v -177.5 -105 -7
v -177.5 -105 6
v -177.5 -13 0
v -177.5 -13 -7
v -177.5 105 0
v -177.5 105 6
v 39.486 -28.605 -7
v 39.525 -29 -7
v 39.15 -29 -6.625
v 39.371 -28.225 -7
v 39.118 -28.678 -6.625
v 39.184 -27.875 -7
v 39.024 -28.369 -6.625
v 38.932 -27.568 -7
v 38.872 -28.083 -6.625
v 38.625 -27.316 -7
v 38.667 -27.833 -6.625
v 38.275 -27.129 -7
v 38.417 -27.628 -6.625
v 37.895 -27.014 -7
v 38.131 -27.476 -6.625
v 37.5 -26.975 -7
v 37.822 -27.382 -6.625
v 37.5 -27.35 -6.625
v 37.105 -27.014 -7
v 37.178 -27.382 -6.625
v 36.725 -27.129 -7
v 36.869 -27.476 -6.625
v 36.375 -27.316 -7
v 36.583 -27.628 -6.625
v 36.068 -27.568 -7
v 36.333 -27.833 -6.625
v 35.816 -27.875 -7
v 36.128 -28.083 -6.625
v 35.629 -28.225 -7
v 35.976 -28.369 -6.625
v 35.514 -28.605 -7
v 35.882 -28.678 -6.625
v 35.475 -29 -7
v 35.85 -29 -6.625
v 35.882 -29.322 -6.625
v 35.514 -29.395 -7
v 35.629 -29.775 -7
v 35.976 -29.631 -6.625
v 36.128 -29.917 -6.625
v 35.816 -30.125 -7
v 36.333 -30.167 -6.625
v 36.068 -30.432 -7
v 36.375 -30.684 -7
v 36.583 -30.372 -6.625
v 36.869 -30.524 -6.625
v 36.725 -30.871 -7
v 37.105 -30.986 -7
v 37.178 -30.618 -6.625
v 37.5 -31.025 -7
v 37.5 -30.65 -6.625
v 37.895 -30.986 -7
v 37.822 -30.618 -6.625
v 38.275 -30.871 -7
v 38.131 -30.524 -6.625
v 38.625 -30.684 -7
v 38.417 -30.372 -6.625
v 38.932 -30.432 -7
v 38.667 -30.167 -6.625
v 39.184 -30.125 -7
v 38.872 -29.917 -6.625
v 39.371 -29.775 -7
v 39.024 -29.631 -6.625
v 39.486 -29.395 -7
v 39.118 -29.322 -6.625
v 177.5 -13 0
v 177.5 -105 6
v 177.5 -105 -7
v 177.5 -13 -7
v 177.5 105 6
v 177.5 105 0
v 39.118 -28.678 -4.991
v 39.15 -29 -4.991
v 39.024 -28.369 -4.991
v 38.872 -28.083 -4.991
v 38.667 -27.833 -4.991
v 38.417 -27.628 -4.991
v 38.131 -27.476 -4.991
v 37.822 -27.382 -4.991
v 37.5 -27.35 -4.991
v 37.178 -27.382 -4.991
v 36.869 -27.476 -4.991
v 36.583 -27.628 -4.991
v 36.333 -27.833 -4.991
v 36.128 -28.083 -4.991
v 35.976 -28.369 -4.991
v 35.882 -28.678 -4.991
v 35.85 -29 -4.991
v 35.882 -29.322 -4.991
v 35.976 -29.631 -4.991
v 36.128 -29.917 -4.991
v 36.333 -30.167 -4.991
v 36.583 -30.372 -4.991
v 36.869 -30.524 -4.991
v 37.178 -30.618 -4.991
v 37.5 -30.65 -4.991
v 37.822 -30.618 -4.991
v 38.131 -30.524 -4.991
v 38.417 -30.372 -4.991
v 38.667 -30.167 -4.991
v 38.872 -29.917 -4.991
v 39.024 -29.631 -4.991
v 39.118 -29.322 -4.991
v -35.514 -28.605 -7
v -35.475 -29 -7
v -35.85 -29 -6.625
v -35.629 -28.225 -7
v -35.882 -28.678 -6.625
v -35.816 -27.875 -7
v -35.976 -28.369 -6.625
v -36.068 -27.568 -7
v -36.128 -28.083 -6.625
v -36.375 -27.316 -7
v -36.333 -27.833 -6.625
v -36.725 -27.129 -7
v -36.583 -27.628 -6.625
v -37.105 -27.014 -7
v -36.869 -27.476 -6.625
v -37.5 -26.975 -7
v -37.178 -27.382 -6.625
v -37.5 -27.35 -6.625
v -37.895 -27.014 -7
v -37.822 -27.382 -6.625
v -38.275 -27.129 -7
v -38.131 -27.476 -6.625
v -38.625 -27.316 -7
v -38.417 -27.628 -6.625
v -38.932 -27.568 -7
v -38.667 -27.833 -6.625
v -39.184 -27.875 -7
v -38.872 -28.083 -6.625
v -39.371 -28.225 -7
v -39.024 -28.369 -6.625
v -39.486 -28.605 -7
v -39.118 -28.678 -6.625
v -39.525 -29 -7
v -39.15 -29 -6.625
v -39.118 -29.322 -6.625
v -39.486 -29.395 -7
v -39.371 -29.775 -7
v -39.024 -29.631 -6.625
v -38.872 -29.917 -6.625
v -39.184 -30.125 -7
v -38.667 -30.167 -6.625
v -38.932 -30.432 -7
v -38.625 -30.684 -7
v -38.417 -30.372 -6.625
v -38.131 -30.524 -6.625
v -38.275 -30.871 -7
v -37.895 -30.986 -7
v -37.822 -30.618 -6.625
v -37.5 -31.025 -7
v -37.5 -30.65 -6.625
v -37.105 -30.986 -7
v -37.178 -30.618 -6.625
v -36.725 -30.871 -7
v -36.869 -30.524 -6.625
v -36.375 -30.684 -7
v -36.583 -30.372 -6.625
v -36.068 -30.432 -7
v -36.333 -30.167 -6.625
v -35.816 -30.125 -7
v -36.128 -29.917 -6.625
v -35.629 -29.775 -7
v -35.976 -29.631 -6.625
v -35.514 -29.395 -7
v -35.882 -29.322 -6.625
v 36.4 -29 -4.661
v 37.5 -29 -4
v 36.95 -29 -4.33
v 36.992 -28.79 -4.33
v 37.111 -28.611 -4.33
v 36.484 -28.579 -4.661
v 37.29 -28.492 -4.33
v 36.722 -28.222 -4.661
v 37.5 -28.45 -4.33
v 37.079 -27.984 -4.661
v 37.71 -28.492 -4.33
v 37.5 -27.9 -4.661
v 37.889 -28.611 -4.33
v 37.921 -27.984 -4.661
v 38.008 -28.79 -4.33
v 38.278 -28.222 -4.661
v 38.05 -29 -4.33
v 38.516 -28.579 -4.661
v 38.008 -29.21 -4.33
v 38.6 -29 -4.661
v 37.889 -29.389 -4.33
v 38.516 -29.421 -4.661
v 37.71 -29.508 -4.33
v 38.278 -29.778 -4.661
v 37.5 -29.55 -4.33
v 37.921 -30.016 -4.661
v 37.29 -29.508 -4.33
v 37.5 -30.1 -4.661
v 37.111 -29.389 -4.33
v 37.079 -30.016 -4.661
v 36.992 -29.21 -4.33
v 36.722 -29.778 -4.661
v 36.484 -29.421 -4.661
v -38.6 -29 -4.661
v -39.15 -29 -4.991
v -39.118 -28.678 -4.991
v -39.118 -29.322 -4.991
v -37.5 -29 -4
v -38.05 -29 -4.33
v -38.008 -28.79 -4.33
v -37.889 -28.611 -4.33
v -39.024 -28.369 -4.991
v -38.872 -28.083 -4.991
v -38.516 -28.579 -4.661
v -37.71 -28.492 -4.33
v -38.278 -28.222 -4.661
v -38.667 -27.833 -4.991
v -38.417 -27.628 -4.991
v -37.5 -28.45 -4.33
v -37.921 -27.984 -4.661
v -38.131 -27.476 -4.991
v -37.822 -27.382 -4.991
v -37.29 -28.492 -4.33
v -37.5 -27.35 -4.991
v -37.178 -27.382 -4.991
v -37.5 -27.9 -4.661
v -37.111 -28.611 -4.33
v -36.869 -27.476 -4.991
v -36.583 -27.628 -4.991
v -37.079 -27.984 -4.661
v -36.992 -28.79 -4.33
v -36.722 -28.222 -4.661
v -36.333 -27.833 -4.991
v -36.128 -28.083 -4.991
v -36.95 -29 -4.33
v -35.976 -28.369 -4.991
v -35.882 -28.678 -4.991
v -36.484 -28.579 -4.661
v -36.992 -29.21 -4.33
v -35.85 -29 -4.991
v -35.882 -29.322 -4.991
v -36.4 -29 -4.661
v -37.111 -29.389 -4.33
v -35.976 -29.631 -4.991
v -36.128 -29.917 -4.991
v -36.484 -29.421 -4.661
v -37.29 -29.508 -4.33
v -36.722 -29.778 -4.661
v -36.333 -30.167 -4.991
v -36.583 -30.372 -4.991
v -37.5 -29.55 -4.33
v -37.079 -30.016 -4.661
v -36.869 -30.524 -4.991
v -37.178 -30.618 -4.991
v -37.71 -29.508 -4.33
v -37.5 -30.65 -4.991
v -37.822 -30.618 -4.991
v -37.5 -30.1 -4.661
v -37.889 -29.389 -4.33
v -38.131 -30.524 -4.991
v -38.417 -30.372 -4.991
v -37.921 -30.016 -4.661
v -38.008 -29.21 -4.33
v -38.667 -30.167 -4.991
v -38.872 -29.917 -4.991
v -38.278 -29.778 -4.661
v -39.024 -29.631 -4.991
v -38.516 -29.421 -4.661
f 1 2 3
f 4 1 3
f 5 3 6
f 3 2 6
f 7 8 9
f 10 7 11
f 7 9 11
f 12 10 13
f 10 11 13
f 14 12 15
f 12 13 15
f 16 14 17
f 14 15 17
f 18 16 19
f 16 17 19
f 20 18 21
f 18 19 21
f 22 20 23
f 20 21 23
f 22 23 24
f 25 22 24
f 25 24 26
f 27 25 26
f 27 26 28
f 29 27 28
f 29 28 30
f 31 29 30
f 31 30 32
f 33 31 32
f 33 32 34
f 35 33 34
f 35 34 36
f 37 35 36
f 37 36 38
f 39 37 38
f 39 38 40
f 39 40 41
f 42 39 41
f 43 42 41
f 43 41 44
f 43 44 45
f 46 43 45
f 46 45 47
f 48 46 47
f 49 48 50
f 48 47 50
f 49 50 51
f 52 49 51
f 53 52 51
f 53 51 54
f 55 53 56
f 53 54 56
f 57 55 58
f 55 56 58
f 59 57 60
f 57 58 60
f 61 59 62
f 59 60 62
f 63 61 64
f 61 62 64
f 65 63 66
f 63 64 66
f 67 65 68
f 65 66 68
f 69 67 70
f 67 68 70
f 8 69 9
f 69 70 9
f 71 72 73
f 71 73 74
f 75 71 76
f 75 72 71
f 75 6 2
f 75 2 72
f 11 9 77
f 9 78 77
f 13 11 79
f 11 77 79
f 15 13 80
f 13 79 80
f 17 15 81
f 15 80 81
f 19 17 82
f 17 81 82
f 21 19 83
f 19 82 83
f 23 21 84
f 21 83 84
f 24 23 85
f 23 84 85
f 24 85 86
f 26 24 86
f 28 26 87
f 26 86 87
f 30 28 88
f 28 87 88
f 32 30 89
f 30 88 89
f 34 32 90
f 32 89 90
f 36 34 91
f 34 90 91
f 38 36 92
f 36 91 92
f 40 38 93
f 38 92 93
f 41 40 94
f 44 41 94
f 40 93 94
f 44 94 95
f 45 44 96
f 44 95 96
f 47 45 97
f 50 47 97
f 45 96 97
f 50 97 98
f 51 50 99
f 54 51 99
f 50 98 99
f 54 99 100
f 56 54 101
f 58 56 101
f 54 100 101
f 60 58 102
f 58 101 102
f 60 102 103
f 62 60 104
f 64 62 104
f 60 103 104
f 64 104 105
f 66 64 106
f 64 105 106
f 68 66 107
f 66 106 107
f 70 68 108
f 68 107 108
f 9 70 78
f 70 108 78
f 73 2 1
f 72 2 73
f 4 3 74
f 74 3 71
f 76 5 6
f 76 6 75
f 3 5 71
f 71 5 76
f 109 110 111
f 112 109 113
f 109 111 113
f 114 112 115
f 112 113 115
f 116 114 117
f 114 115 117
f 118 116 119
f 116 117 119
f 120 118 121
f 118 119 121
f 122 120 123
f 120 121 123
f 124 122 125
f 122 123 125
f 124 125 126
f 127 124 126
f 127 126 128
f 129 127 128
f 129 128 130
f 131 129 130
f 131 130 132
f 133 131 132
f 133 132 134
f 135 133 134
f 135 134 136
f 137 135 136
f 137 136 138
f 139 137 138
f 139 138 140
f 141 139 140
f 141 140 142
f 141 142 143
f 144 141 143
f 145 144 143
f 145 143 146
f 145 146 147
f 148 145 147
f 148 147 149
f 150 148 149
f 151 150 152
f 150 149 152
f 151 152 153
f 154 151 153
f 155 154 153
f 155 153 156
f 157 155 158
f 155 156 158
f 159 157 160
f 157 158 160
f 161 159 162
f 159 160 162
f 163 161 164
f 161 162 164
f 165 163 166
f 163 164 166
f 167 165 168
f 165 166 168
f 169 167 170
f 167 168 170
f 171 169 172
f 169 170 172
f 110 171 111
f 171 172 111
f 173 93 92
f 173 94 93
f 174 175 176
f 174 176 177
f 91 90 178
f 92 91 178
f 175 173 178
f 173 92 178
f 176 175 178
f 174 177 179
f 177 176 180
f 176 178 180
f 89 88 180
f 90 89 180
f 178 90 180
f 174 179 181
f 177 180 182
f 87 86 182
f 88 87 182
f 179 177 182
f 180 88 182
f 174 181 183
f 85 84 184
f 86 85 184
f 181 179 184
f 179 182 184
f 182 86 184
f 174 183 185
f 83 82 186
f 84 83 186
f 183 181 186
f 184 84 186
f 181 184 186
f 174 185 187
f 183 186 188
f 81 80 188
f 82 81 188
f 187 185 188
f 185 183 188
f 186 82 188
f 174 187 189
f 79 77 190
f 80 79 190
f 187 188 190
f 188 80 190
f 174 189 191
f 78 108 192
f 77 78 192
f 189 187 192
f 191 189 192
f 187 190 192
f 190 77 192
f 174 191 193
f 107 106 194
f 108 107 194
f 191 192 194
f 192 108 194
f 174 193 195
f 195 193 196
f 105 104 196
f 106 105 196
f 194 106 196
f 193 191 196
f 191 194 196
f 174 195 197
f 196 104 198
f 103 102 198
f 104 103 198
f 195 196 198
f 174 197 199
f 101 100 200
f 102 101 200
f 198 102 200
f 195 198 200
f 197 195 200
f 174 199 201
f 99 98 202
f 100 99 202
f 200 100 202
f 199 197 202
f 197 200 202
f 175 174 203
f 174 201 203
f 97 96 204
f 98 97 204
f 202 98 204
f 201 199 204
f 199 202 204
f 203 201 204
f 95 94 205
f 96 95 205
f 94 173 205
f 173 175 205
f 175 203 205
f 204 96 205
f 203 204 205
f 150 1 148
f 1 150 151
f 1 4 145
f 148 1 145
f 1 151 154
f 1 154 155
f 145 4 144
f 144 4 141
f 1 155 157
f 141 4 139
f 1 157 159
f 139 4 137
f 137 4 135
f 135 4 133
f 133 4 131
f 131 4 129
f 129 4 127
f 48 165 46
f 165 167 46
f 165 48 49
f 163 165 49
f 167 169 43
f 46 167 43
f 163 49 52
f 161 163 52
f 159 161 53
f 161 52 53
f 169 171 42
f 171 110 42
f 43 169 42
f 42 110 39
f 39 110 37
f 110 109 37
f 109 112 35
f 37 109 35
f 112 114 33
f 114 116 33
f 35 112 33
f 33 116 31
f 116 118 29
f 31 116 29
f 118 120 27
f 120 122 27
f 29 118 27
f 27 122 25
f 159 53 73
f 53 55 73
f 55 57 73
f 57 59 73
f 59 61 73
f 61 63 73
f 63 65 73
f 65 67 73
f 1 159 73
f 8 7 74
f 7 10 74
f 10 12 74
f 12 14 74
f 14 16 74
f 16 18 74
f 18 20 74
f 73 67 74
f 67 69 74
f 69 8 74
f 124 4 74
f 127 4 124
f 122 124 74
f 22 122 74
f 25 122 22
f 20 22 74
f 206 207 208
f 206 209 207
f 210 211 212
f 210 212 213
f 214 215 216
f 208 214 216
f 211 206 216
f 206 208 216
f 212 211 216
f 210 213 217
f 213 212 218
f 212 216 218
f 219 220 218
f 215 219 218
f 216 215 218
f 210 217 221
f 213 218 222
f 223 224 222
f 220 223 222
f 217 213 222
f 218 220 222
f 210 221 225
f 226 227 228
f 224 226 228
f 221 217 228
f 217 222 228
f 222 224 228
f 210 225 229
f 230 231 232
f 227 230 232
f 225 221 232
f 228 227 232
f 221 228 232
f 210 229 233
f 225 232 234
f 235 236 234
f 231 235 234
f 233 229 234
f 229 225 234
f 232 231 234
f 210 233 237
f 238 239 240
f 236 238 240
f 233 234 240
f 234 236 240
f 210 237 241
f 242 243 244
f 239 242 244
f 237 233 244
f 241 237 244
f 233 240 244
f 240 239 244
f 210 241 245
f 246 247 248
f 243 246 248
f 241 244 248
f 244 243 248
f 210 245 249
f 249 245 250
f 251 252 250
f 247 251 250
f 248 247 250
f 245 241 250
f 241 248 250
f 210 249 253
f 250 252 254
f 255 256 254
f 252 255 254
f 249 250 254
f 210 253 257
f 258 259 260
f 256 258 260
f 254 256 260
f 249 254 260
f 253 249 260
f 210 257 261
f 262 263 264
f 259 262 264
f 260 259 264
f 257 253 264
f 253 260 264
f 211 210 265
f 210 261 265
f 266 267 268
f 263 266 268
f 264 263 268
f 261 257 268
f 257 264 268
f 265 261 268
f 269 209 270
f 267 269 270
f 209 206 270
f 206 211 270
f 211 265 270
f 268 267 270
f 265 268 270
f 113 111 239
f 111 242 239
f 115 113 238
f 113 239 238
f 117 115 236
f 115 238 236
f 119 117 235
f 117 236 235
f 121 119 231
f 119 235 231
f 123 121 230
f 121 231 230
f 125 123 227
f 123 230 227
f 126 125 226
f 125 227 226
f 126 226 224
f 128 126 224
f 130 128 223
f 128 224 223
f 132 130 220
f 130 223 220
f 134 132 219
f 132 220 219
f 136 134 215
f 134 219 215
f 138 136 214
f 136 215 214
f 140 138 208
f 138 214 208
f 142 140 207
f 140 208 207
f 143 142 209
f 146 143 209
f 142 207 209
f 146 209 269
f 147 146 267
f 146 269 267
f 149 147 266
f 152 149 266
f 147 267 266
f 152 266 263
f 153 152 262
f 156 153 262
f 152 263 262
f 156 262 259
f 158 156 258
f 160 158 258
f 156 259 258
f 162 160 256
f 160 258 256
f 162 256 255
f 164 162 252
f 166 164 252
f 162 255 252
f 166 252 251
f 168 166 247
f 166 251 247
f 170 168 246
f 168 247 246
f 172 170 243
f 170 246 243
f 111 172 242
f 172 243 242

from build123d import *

# Parameters (mm, degrees)
SKETCH1_W                   = 355
SKETCH1_H                   = 210
BOSS_EXTRUDE1_DEPTH         = 6
SKETCH2_W                   = 355
SKETCH2_H                   = 92
BOSS_EXTRUDE2_DEPTH         = 7
M4_TAPPED_HOLE2_D           = 3.3
M4_TAPPED_HOLE2_DEPTH       = 2.008579979
M4_TAPPED_HOLE2_CSINK_D     = 4.05
M4_TAPPED_HOLE2_CSINK_ANGLE = 90
M4_TAPPED_HOLE2_TIP         = 0.991420021


with BuildPart() as part:
    # Sketch1 → Boss-Extrude1 (new body)
    with BuildSketch(Plane.XY):
        Rectangle(SKETCH1_W, SKETCH1_H)
    extrude(amount=BOSS_EXTRUDE1_DEPTH)

    # Sketch2 → Boss-Extrude2 (add)
    with BuildSketch(Plane.XY):
        with Locations((0, -59)):
            Rectangle(SKETCH2_W, SKETCH2_H)
    extrude(amount=-BOSS_EXTRUDE2_DEPTH)

    # M4 Tapped Hole2
    with Locations(Plane(origin=(0, 0, -7), x_dir=(-1, 0, 0), z_dir=(0, 0, -1))):
        with Locations((37.5, -29), (-37.5, -29)):
            CounterSinkHole(M4_TAPPED_HOLE2_D / 2, M4_TAPPED_HOLE2_CSINK_D / 2, depth=M4_TAPPED_HOLE2_DEPTH, counter_sink_angle=M4_TAPPED_HOLE2_CSINK_ANGLE)
            with Locations((0, 0, -(M4_TAPPED_HOLE2_DEPTH + M4_TAPPED_HOLE2_TIP / 2))):  # 118° drill point
                Cone(0, M4_TAPPED_HOLE2_D / 2, M4_TAPPED_HOLE2_TIP, mode=Mode.SUBTRACT)


solid = part.part
